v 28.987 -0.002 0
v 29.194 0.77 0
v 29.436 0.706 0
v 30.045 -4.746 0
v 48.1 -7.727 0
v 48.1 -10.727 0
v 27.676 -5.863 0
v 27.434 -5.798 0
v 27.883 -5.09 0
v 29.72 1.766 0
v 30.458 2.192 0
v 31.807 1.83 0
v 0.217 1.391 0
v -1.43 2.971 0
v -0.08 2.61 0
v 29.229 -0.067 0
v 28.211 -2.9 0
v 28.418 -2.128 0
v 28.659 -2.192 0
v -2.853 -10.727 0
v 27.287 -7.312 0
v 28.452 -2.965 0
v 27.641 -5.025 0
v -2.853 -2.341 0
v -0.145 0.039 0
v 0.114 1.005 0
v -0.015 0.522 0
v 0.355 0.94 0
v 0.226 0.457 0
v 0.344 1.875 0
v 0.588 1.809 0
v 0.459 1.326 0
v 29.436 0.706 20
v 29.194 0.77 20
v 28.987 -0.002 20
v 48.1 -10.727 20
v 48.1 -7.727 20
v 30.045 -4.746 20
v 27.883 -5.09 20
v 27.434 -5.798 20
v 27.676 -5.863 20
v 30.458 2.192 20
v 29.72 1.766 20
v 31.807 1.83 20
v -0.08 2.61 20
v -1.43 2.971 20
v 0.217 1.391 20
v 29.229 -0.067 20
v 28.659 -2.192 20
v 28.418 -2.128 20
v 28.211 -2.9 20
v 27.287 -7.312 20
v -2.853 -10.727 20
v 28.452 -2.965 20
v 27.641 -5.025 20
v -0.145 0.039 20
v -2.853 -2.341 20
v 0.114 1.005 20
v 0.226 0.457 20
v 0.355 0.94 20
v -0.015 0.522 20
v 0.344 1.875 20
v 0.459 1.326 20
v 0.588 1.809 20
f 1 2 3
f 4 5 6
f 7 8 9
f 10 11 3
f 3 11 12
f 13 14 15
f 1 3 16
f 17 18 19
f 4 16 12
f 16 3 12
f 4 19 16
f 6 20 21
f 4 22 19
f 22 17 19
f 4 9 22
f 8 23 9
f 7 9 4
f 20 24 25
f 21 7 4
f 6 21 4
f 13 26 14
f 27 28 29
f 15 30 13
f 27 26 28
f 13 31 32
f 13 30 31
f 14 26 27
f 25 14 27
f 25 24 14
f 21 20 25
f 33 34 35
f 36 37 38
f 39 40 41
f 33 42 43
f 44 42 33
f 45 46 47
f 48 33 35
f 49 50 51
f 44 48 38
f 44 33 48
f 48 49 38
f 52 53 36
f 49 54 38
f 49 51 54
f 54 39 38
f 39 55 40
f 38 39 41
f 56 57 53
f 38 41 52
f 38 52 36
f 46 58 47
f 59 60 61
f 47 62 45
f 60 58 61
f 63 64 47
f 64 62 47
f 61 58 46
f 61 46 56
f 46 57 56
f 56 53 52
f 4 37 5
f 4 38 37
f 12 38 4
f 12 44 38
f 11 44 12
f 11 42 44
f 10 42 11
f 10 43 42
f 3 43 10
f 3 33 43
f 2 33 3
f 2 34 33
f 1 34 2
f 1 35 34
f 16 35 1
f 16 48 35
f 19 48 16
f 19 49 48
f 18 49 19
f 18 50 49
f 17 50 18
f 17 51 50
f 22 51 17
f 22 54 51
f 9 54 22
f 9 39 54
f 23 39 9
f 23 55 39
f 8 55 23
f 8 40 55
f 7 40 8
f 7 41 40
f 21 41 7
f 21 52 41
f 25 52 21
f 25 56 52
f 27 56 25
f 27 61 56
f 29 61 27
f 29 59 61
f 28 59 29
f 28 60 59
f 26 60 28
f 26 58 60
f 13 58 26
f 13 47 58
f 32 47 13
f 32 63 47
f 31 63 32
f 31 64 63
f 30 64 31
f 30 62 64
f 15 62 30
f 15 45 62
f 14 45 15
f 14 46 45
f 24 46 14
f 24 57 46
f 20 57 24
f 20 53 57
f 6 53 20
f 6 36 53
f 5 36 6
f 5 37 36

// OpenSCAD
// A clip-on foot for the Dot Matrix case: it leans the case back so the LEDs
// face a little upward. Print two. The case is pushed down into it; ribs on
// the inside of the lips grip it, with no screws.
//
// Printed lying on its side, as exported: the profile on the bed, so the lips
// are built within the layers (stronger) and nothing overhangs.
//
// The profile is in the case's end view: x from the case's front (0) to its
// back, y up; the part is `width` long along the case.

lean    = 15;     // degrees the case leans back (10 works too)
width   = 20;     // along the case
depth   = 28.1;   // the case, front face to the back of the cover
fit     = 0.15;   // clearance each side of the case
rib     = 0.25;   // ribs stand this far in from the lips (0.1 grip each side)
t       = 3;      // floor thickness, and the lips' thickness is `w`
w       = 2;
lip_f   = 2.5;    // front lip height: below the LEDs (they start 3.25 up)
lip_b   = 10;     // back lip height, against the cover
behind  = 20;     // how far the foot reaches behind the case
chamfer = 0.6;    // lead-in on the lips' inner top edges

$fn = 24;

module lean() rotate(-lean) children();

module profile() {
    slab_y0 = -t;
    // the case's slot, a little wider than the case, cut out of everything
    difference() {
        union() {
            lean() translate([-fit - w, slab_y0]) square([depth + 2 * fit + 2 * w, t]);
            lean() translate([-fit - w, 0]) square([w, lip_f]);
            lean() translate([depth + fit, 0]) square([w, lip_b]);
            // solid down to a flat base on the shelf, reaching back
            hull() {
                lean() translate([-fit - w, slab_y0]) square([depth + 2 * fit + 2 * w, t]);
                translate([base_x0(), base_y0()]) square([depth + behind - base_x0(), t]);
            }
        }
        lean() translate([-fit, 0]) square([depth + 2 * fit, 100]);
        // lead-in chamfers
        lean() {
            translate([-fit, lip_f]) rotate(45) square(chamfer * 1.42, center = true);
            translate([depth + fit, lip_b]) rotate(45) square(chamfer * 1.42, center = true);
        }
    }
    // ribs on the lips' inner faces, running along the width
    lean() {
        for (y = [0.5, 1.4]) translate([-fit - 0.01, y]) square([rib + 0.01, 0.5]);
        for (y = [1.5, 4.5, 7.5]) translate([depth + fit - rib, y]) square([rib + 0.01, 0.8]);
    }
}

// The rotated floor's lowest corner sets where the base sits.
function rot(p) = [p[0] * cos(-lean) - p[1] * sin(-lean), p[0] * sin(-lean) + p[1] * cos(-lean)];
function base_y0() = min(rot([-fit - w, -t])[1], rot([depth + fit + w, -t])[1]);
function base_x0() = rot([-fit - w, -t])[0];

linear_extrude(width) profile();
